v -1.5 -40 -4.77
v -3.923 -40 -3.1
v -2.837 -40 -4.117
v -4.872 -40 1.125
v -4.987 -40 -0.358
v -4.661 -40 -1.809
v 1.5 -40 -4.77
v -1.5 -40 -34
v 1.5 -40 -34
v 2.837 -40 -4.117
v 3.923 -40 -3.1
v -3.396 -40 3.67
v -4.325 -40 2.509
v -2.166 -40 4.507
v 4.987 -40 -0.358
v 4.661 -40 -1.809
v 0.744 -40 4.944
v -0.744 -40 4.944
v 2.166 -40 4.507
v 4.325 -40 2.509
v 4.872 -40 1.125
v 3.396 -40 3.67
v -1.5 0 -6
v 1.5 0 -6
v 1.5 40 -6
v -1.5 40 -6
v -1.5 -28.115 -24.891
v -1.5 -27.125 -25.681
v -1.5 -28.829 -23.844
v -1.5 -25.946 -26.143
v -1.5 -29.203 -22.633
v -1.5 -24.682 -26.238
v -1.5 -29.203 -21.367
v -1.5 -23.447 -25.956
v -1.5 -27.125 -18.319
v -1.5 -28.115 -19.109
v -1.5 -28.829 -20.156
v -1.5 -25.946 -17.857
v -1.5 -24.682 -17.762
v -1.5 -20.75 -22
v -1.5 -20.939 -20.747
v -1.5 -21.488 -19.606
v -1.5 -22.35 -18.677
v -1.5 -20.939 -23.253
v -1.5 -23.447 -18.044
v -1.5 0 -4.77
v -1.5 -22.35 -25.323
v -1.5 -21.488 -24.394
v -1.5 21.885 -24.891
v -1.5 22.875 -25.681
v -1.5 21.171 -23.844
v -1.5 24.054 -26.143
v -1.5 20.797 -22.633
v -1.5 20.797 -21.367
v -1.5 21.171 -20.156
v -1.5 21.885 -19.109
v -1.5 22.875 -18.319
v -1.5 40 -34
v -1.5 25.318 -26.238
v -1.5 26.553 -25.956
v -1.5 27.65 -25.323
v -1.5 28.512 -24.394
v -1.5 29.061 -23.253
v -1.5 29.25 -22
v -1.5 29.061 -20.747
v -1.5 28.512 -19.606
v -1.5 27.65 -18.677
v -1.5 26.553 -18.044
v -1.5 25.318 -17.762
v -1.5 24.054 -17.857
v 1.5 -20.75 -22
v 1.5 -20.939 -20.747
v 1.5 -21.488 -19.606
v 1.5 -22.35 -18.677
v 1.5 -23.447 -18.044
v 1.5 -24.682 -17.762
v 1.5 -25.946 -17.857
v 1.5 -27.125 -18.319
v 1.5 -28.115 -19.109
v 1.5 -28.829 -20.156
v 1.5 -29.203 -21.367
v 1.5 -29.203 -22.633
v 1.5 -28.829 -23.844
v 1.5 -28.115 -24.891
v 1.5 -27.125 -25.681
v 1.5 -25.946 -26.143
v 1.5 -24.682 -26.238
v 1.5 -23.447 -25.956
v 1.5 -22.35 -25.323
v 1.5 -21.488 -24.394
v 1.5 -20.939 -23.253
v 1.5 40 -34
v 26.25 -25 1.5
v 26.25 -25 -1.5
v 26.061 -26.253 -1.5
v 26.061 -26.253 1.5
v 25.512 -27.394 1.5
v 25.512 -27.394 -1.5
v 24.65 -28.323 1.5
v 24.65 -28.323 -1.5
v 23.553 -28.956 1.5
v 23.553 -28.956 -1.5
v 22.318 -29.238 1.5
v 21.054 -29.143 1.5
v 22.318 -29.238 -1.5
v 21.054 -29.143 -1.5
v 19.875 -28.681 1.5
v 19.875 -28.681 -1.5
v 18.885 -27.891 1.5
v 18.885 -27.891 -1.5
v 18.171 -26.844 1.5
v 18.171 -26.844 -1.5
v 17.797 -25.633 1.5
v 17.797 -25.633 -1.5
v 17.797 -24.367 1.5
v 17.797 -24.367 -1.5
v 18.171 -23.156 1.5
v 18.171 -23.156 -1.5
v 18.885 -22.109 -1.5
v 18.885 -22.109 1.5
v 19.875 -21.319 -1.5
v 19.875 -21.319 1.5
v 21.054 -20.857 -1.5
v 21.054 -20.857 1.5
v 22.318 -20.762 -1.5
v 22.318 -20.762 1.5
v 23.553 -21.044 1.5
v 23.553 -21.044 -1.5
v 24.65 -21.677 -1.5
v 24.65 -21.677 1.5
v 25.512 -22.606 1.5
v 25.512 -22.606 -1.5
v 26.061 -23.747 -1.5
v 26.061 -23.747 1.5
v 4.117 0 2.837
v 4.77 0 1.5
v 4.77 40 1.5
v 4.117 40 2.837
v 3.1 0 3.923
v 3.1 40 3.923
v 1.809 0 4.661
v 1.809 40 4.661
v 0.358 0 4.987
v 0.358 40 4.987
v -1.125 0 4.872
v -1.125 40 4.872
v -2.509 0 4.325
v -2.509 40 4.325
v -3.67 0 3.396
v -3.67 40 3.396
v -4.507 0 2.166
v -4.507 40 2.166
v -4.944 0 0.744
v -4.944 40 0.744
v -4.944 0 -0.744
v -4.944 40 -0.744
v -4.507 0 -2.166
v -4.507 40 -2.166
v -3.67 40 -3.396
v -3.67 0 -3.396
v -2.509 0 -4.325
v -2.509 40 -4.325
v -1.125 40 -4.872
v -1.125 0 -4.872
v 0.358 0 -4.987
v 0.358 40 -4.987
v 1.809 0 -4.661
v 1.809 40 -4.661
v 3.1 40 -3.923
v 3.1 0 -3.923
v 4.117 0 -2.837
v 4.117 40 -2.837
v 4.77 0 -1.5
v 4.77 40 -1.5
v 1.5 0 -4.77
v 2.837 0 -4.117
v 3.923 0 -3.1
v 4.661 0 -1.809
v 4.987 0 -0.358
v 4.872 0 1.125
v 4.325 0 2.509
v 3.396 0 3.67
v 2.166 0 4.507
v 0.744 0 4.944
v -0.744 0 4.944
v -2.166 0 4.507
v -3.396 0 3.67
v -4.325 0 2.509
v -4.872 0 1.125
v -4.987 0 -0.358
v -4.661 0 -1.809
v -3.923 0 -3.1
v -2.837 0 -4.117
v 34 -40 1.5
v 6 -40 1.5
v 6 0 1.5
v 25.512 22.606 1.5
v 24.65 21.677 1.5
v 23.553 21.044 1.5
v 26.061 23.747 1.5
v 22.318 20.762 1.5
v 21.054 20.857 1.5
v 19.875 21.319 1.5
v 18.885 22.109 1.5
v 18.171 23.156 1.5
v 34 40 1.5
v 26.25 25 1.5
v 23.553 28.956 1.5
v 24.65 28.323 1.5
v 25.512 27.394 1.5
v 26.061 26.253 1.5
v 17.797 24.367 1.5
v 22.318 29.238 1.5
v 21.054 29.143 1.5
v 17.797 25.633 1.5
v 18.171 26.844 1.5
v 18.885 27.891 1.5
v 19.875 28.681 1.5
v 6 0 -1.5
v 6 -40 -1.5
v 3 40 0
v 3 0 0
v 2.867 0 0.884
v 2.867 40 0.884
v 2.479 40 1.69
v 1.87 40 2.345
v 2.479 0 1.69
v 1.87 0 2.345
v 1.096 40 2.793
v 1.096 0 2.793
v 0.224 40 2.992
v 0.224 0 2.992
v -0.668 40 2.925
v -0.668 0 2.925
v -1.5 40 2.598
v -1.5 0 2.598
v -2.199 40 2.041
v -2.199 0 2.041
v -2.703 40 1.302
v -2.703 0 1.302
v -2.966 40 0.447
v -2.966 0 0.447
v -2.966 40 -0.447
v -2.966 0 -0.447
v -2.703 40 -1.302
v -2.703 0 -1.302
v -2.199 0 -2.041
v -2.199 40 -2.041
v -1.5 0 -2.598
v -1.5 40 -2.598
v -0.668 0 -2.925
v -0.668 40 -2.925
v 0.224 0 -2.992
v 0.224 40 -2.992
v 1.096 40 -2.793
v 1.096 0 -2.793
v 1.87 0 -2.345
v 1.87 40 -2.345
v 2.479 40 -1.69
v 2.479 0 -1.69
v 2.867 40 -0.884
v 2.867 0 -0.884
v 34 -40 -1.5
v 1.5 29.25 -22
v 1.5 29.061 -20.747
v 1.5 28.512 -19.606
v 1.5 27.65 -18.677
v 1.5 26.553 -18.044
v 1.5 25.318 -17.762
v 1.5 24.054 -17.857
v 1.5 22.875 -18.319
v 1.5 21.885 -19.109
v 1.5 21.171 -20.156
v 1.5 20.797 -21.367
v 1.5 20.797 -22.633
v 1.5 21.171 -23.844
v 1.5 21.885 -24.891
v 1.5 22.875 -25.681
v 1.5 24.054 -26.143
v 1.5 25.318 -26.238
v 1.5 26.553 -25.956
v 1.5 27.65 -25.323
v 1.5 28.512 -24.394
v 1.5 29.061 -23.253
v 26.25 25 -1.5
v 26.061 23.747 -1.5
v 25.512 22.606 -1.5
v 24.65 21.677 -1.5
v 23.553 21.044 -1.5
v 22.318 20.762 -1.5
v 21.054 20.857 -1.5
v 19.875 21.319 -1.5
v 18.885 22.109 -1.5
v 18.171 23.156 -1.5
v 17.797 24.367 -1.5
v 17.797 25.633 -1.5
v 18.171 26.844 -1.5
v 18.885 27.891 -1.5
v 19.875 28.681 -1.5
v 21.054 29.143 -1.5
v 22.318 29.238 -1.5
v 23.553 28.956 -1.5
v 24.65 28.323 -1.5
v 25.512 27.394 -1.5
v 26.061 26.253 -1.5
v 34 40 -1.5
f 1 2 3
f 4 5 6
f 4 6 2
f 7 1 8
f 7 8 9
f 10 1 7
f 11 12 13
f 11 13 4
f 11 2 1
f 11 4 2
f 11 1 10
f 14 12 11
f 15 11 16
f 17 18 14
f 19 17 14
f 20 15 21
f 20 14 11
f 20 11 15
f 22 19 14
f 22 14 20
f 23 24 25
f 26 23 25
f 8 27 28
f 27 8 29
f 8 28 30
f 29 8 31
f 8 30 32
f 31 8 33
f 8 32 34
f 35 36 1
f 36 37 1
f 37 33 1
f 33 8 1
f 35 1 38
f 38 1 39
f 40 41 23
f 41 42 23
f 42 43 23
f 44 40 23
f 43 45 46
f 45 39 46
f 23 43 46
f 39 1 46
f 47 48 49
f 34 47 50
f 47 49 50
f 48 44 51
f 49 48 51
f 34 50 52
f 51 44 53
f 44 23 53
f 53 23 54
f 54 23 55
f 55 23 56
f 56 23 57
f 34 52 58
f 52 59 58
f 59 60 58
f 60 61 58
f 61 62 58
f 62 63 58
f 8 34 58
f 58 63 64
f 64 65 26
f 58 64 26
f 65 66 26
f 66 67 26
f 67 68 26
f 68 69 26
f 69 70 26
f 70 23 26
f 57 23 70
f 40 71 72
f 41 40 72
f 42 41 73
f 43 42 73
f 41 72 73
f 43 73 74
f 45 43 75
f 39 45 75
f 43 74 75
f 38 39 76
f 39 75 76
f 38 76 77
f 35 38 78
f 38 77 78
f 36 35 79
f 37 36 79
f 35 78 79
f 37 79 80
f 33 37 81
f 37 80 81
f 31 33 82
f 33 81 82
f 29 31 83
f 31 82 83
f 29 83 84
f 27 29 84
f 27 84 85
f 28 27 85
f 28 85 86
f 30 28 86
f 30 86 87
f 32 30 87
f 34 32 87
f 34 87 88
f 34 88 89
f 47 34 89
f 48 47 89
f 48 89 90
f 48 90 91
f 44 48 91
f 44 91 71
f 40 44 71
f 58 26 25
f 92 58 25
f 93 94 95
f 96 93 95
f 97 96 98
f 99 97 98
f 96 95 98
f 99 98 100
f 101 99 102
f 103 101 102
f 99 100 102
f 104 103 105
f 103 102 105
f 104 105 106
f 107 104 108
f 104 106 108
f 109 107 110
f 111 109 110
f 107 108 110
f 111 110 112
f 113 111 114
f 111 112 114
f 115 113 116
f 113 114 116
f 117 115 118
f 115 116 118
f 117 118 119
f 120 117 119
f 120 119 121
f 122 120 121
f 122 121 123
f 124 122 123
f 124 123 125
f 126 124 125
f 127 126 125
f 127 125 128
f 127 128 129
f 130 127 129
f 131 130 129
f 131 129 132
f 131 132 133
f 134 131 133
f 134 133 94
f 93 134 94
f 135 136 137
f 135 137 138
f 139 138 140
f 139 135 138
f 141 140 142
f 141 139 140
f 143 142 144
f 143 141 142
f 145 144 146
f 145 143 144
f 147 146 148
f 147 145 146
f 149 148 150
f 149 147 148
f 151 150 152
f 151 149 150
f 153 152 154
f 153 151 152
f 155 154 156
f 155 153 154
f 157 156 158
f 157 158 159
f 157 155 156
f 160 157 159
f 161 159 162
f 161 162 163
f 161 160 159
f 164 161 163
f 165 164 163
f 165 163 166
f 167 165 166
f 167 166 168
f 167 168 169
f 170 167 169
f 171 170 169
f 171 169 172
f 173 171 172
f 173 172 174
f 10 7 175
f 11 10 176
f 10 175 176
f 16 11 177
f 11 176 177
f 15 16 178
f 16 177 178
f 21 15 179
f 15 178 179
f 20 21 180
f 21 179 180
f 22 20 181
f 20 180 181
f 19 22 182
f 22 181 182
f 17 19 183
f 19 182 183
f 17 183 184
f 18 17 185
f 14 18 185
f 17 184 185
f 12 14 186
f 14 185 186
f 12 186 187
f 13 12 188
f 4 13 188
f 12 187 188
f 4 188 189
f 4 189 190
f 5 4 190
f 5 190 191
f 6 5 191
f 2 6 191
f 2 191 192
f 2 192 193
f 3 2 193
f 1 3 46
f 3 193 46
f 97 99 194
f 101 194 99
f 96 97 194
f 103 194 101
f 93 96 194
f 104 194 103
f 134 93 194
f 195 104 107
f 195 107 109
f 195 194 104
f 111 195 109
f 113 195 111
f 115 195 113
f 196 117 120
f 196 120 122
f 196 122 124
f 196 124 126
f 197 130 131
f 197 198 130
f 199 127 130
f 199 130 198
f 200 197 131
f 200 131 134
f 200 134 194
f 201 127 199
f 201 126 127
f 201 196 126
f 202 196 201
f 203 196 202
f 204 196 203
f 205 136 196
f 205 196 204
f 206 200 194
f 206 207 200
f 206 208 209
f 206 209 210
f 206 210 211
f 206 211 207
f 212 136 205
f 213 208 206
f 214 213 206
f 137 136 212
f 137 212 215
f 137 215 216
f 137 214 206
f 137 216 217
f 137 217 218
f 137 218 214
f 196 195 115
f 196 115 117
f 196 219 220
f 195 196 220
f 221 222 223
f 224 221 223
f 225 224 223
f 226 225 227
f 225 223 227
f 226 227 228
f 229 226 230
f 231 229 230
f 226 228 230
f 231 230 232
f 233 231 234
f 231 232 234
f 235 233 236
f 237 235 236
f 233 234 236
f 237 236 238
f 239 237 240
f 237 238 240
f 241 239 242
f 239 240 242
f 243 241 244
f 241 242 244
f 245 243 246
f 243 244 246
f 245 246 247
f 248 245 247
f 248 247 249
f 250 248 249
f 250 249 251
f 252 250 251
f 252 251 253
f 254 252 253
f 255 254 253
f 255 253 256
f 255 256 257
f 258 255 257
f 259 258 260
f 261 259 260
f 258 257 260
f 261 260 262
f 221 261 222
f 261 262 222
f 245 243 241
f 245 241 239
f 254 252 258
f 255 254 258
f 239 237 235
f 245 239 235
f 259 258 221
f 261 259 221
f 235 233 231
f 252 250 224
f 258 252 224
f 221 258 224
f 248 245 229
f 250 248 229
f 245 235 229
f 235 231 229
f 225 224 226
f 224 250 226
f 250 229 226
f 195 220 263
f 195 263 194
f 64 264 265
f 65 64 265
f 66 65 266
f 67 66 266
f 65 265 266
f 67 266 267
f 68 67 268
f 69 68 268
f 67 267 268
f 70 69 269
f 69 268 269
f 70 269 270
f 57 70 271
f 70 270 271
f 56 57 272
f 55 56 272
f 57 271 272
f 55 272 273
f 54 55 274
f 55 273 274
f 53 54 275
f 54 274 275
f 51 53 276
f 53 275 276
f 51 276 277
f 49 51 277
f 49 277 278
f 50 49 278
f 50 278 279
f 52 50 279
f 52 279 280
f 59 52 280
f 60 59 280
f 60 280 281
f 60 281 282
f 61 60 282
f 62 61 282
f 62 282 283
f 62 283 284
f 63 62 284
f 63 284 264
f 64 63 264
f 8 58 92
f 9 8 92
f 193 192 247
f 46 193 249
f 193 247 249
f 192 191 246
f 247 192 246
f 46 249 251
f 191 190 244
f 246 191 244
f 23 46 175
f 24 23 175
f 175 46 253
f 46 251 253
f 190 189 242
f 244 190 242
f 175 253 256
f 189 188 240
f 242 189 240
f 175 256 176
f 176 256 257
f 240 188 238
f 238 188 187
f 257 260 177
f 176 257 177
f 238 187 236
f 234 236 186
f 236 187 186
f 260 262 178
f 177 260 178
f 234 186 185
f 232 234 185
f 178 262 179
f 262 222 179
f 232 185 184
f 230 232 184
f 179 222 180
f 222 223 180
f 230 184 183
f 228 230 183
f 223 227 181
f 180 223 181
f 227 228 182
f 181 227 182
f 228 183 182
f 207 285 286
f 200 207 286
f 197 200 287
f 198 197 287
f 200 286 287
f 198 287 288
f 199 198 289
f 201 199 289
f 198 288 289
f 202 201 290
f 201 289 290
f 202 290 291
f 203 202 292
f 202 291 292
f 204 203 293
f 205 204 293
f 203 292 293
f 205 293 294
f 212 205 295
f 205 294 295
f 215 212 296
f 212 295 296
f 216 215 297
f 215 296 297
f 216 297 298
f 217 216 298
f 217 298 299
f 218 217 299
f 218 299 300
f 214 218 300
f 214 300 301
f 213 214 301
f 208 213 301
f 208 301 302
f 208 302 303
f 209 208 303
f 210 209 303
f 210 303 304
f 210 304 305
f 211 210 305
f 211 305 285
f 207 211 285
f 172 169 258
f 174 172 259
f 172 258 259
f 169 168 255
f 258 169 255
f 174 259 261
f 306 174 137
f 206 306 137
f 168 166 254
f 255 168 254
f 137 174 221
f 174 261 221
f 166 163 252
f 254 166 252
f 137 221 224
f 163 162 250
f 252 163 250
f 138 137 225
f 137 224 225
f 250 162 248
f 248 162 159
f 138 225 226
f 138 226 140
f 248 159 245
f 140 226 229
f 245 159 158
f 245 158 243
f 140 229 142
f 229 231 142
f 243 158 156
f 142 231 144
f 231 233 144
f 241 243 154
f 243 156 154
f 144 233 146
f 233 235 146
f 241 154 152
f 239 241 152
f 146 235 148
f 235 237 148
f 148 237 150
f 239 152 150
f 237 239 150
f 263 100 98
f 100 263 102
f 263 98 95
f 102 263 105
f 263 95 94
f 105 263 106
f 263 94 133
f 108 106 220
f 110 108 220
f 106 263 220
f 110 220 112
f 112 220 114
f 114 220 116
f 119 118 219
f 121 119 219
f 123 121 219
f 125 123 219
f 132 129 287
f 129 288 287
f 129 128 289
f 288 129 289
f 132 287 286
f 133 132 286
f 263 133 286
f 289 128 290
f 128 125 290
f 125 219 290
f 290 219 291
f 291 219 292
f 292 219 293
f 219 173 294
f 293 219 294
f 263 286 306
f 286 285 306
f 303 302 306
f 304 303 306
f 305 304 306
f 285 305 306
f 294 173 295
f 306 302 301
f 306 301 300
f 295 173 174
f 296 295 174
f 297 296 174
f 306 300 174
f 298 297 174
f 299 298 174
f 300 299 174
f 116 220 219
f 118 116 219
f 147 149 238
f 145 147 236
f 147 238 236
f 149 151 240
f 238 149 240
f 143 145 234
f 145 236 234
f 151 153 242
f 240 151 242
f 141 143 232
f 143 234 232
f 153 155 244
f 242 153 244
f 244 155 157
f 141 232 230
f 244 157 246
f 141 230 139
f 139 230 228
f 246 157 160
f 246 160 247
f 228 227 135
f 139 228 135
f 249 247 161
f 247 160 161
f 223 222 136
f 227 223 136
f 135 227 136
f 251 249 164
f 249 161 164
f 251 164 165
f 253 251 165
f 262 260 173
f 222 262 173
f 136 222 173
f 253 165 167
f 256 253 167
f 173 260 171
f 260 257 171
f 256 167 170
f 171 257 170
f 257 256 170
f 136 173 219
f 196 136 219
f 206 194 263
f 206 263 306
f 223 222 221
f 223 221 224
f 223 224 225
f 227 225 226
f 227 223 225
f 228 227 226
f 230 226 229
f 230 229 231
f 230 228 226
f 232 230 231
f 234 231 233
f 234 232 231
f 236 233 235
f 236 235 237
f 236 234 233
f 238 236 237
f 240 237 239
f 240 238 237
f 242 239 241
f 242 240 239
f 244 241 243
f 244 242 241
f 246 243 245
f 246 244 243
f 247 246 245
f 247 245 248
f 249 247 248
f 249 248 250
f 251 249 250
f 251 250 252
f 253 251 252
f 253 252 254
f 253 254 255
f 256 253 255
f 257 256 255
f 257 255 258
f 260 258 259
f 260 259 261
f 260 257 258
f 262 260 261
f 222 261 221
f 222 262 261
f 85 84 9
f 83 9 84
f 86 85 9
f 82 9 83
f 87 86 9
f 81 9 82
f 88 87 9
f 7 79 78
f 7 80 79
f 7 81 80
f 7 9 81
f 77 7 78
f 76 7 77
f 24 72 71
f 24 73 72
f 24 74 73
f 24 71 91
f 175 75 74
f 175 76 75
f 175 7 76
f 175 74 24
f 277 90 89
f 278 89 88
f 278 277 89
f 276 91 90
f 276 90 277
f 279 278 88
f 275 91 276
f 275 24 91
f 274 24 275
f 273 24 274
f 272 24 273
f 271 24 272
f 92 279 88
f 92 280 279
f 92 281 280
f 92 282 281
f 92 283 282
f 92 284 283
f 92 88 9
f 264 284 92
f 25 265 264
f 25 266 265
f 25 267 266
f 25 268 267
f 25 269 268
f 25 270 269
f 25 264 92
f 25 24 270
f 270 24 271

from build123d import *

# Parameters (mm, degrees)
F0_R      = 5
F1_DEPTH  = 40
F2_R      = 3
F3_DEPTH  = 40
F5_W      = 3
F5_H      = 80
F6_DEPTH  = 30
F7_R      = 5
F7_R_2    = 3
F8_DEPTH  = 40
F10_W     = 80
F10_H     = 3
F11_DEPTH = 30
F12_W     = 40
F12_H     = 2
F13_DEPTH = 25
F14_W     = 2
F14_H     = 40
F15_DEPTH = 25
F16_R     = 4.25
F17_DEPTH = 25
F18_R     = 4.25
F19_DEPTH = 25


with BuildPart() as f1:
    # F0 (on Front) → F1 (new body)
    with BuildSketch(Plane.XZ):
        Circle(F0_R)
    extrude(amount=F1_DEPTH)

    # F2 (on Front) → F3 (join)
    with BuildSketch(Plane.XZ):
        Circle(F2_R)
    extrude(amount=-F3_DEPTH)

    # F5 (on offset) → F6 (join)
    with BuildSketch(Plane.XY.offset(-4)):
        Rectangle(F5_W, F5_H)
    extrude(amount=-F6_DEPTH)

    # F12 (on face) → F13 (cut)
    with BuildSketch(Plane.YZ.offset(1.5)):
        with Locations((20, -5)):
            Rectangle(F12_W, F12_H)
    extrude(amount=-F13_DEPTH, mode=Mode.SUBTRACT)

    # F18 (on face) → F19 (cut)
    with BuildSketch(Plane.YZ.offset(1.5)):
        with Locations((-25, -22)):
            Circle(F18_R)
        with Locations((25, -22)):
            Circle(F18_R)
    extrude(amount=-F19_DEPTH, mode=Mode.SUBTRACT)


with BuildPart() as f8:
    # F7 (on Front) → F8 (new body)
    with BuildSketch(Plane.XZ):
        Circle(F7_R)
        Circle(F7_R_2, mode=Mode.SUBTRACT)
    extrude(amount=-F8_DEPTH)

    # F10 (on offset) → F11 (join)
    with BuildSketch(Plane.YZ.offset(4)):
        Rectangle(F10_W, F10_H)
    extrude(amount=F11_DEPTH)

    # F14 (on face) → F15 (cut)
    with BuildSketch(Plane(origin=(0, 0, -1.5), x_dir=(1, 0, 0), z_dir=(0, 0, -1))):
        with Locations((5, 20)):
            Rectangle(F14_W, F14_H)
    extrude(amount=-F15_DEPTH, mode=Mode.SUBTRACT)

    # F16 (on face) → F17 (cut)
    with BuildSketch(Plane(origin=(0, 0, -1.5), x_dir=(1, 0, 0), z_dir=(0, 0, -1))):
        with Locations((22, 25)):
            Circle(F16_R)
        with Locations((22, -25)):
            Circle(F16_R)
    extrude(amount=-F17_DEPTH, mode=Mode.SUBTRACT)


solid = Compound([f1.part, f8.part])
